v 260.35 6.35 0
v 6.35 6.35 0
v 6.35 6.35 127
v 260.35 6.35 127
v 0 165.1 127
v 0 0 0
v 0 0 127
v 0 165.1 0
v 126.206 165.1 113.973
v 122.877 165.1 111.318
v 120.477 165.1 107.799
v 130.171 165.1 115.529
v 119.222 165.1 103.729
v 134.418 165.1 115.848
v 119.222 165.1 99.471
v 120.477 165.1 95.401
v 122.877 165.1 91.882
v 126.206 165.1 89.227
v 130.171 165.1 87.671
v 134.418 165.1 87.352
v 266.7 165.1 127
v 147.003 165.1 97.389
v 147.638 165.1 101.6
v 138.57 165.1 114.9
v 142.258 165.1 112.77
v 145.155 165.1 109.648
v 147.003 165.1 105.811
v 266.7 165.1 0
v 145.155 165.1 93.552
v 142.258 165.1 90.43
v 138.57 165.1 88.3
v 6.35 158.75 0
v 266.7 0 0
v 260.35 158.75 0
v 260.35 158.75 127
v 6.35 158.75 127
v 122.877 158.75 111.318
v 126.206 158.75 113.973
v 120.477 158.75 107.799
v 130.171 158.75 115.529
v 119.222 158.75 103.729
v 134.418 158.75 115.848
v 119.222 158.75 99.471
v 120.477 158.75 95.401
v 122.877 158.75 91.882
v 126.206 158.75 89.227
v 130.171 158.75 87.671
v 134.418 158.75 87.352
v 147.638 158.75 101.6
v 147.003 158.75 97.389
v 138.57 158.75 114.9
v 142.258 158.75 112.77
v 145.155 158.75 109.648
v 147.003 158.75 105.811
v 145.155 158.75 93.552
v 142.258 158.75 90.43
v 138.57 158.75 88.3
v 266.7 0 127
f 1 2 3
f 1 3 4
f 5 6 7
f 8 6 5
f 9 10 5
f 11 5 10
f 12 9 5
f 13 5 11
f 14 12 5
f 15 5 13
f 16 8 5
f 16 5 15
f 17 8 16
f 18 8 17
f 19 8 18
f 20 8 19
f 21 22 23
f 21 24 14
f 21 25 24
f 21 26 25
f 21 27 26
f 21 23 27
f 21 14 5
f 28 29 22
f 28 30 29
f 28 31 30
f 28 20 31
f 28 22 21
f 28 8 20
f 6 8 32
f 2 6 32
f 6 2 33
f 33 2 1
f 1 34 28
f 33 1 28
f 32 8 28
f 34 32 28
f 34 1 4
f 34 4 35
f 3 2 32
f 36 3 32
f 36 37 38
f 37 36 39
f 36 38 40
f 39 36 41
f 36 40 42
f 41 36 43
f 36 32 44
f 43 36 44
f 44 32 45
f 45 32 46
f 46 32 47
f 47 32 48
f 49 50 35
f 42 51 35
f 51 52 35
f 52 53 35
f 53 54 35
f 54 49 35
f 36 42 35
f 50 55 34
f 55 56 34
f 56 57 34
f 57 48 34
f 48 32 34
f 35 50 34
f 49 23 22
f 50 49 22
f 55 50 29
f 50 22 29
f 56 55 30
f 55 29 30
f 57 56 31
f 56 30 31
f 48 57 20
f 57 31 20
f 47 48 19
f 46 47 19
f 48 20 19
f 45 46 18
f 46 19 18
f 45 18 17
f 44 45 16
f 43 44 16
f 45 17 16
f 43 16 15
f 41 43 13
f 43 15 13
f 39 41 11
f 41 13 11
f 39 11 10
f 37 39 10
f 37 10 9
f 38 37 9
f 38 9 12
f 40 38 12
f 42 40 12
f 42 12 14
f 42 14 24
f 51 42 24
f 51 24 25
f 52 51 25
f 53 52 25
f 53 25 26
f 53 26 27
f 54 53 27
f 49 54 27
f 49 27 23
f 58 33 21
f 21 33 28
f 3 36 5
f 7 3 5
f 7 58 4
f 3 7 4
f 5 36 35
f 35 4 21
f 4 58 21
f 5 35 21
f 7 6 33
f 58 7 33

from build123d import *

# Parameters (mm, degrees)
SKETCH1_W           = 266.7
SKETCH1_H           = 165.1
SKETCH1_W_2         = 254
SKETCH1_H_2         = 152.4
BOSS_EXTRUDE1_DEPTH = 215.9
SKETCH4_W           = 88.9
SKETCH4_H           = 165.1
CUT_EXTRUDE2_DEPTH  = 267.7
CUT_EXTRUDE3_REACH  = 167.1
SKETCH5_R           = 14.2875


with BuildPart() as part:
    # Sketch1 → Boss-Extrude1 (new body)
    with BuildSketch(Plane.XY):
        with Locations((133.35, 82.55)):
            Rectangle(SKETCH1_W, SKETCH1_H)
        with Locations((133.35, 82.55)):
            Rectangle(SKETCH1_W_2, SKETCH1_H_2, mode=Mode.SUBTRACT)
    extrude(amount=BOSS_EXTRUDE1_DEPTH)

    # Sketch4 → Cut-Extrude2 (cut, through all)
    with BuildSketch(Plane(origin=(266.7, 0, 0), x_dir=(0, 0, -1), z_dir=(1, 0, 0))):
        with Locations((-171.45, 82.55)):
            Rectangle(SKETCH4_W, SKETCH4_H)
    extrude(amount=-CUT_EXTRUDE2_DEPTH, mode=Mode.SUBTRACT)

    # Sketch5 → Cut-Extrude3 (cut, up to next)
    with BuildSketch(Plane(origin=(0, 165.1, 0), x_dir=(1, 0, 0), z_dir=(0, 1, 0)), mode=Mode.PRIVATE) as cut_extrude3_sk1:
        with Locations((133.35, -101.6)):
            Circle(SKETCH5_R)
    cut_extrude3_tool1 = extrude(cut_extrude3_sk1.sketch, amount=-CUT_EXTRUDE3_REACH, mode=Mode.PRIVATE) & part.part
    add(cut_extrude3_tool1.solids().sort_by_distance((133.35, 165.1, 101.6))[0], mode=Mode.SUBTRACT)


solid = part.part
